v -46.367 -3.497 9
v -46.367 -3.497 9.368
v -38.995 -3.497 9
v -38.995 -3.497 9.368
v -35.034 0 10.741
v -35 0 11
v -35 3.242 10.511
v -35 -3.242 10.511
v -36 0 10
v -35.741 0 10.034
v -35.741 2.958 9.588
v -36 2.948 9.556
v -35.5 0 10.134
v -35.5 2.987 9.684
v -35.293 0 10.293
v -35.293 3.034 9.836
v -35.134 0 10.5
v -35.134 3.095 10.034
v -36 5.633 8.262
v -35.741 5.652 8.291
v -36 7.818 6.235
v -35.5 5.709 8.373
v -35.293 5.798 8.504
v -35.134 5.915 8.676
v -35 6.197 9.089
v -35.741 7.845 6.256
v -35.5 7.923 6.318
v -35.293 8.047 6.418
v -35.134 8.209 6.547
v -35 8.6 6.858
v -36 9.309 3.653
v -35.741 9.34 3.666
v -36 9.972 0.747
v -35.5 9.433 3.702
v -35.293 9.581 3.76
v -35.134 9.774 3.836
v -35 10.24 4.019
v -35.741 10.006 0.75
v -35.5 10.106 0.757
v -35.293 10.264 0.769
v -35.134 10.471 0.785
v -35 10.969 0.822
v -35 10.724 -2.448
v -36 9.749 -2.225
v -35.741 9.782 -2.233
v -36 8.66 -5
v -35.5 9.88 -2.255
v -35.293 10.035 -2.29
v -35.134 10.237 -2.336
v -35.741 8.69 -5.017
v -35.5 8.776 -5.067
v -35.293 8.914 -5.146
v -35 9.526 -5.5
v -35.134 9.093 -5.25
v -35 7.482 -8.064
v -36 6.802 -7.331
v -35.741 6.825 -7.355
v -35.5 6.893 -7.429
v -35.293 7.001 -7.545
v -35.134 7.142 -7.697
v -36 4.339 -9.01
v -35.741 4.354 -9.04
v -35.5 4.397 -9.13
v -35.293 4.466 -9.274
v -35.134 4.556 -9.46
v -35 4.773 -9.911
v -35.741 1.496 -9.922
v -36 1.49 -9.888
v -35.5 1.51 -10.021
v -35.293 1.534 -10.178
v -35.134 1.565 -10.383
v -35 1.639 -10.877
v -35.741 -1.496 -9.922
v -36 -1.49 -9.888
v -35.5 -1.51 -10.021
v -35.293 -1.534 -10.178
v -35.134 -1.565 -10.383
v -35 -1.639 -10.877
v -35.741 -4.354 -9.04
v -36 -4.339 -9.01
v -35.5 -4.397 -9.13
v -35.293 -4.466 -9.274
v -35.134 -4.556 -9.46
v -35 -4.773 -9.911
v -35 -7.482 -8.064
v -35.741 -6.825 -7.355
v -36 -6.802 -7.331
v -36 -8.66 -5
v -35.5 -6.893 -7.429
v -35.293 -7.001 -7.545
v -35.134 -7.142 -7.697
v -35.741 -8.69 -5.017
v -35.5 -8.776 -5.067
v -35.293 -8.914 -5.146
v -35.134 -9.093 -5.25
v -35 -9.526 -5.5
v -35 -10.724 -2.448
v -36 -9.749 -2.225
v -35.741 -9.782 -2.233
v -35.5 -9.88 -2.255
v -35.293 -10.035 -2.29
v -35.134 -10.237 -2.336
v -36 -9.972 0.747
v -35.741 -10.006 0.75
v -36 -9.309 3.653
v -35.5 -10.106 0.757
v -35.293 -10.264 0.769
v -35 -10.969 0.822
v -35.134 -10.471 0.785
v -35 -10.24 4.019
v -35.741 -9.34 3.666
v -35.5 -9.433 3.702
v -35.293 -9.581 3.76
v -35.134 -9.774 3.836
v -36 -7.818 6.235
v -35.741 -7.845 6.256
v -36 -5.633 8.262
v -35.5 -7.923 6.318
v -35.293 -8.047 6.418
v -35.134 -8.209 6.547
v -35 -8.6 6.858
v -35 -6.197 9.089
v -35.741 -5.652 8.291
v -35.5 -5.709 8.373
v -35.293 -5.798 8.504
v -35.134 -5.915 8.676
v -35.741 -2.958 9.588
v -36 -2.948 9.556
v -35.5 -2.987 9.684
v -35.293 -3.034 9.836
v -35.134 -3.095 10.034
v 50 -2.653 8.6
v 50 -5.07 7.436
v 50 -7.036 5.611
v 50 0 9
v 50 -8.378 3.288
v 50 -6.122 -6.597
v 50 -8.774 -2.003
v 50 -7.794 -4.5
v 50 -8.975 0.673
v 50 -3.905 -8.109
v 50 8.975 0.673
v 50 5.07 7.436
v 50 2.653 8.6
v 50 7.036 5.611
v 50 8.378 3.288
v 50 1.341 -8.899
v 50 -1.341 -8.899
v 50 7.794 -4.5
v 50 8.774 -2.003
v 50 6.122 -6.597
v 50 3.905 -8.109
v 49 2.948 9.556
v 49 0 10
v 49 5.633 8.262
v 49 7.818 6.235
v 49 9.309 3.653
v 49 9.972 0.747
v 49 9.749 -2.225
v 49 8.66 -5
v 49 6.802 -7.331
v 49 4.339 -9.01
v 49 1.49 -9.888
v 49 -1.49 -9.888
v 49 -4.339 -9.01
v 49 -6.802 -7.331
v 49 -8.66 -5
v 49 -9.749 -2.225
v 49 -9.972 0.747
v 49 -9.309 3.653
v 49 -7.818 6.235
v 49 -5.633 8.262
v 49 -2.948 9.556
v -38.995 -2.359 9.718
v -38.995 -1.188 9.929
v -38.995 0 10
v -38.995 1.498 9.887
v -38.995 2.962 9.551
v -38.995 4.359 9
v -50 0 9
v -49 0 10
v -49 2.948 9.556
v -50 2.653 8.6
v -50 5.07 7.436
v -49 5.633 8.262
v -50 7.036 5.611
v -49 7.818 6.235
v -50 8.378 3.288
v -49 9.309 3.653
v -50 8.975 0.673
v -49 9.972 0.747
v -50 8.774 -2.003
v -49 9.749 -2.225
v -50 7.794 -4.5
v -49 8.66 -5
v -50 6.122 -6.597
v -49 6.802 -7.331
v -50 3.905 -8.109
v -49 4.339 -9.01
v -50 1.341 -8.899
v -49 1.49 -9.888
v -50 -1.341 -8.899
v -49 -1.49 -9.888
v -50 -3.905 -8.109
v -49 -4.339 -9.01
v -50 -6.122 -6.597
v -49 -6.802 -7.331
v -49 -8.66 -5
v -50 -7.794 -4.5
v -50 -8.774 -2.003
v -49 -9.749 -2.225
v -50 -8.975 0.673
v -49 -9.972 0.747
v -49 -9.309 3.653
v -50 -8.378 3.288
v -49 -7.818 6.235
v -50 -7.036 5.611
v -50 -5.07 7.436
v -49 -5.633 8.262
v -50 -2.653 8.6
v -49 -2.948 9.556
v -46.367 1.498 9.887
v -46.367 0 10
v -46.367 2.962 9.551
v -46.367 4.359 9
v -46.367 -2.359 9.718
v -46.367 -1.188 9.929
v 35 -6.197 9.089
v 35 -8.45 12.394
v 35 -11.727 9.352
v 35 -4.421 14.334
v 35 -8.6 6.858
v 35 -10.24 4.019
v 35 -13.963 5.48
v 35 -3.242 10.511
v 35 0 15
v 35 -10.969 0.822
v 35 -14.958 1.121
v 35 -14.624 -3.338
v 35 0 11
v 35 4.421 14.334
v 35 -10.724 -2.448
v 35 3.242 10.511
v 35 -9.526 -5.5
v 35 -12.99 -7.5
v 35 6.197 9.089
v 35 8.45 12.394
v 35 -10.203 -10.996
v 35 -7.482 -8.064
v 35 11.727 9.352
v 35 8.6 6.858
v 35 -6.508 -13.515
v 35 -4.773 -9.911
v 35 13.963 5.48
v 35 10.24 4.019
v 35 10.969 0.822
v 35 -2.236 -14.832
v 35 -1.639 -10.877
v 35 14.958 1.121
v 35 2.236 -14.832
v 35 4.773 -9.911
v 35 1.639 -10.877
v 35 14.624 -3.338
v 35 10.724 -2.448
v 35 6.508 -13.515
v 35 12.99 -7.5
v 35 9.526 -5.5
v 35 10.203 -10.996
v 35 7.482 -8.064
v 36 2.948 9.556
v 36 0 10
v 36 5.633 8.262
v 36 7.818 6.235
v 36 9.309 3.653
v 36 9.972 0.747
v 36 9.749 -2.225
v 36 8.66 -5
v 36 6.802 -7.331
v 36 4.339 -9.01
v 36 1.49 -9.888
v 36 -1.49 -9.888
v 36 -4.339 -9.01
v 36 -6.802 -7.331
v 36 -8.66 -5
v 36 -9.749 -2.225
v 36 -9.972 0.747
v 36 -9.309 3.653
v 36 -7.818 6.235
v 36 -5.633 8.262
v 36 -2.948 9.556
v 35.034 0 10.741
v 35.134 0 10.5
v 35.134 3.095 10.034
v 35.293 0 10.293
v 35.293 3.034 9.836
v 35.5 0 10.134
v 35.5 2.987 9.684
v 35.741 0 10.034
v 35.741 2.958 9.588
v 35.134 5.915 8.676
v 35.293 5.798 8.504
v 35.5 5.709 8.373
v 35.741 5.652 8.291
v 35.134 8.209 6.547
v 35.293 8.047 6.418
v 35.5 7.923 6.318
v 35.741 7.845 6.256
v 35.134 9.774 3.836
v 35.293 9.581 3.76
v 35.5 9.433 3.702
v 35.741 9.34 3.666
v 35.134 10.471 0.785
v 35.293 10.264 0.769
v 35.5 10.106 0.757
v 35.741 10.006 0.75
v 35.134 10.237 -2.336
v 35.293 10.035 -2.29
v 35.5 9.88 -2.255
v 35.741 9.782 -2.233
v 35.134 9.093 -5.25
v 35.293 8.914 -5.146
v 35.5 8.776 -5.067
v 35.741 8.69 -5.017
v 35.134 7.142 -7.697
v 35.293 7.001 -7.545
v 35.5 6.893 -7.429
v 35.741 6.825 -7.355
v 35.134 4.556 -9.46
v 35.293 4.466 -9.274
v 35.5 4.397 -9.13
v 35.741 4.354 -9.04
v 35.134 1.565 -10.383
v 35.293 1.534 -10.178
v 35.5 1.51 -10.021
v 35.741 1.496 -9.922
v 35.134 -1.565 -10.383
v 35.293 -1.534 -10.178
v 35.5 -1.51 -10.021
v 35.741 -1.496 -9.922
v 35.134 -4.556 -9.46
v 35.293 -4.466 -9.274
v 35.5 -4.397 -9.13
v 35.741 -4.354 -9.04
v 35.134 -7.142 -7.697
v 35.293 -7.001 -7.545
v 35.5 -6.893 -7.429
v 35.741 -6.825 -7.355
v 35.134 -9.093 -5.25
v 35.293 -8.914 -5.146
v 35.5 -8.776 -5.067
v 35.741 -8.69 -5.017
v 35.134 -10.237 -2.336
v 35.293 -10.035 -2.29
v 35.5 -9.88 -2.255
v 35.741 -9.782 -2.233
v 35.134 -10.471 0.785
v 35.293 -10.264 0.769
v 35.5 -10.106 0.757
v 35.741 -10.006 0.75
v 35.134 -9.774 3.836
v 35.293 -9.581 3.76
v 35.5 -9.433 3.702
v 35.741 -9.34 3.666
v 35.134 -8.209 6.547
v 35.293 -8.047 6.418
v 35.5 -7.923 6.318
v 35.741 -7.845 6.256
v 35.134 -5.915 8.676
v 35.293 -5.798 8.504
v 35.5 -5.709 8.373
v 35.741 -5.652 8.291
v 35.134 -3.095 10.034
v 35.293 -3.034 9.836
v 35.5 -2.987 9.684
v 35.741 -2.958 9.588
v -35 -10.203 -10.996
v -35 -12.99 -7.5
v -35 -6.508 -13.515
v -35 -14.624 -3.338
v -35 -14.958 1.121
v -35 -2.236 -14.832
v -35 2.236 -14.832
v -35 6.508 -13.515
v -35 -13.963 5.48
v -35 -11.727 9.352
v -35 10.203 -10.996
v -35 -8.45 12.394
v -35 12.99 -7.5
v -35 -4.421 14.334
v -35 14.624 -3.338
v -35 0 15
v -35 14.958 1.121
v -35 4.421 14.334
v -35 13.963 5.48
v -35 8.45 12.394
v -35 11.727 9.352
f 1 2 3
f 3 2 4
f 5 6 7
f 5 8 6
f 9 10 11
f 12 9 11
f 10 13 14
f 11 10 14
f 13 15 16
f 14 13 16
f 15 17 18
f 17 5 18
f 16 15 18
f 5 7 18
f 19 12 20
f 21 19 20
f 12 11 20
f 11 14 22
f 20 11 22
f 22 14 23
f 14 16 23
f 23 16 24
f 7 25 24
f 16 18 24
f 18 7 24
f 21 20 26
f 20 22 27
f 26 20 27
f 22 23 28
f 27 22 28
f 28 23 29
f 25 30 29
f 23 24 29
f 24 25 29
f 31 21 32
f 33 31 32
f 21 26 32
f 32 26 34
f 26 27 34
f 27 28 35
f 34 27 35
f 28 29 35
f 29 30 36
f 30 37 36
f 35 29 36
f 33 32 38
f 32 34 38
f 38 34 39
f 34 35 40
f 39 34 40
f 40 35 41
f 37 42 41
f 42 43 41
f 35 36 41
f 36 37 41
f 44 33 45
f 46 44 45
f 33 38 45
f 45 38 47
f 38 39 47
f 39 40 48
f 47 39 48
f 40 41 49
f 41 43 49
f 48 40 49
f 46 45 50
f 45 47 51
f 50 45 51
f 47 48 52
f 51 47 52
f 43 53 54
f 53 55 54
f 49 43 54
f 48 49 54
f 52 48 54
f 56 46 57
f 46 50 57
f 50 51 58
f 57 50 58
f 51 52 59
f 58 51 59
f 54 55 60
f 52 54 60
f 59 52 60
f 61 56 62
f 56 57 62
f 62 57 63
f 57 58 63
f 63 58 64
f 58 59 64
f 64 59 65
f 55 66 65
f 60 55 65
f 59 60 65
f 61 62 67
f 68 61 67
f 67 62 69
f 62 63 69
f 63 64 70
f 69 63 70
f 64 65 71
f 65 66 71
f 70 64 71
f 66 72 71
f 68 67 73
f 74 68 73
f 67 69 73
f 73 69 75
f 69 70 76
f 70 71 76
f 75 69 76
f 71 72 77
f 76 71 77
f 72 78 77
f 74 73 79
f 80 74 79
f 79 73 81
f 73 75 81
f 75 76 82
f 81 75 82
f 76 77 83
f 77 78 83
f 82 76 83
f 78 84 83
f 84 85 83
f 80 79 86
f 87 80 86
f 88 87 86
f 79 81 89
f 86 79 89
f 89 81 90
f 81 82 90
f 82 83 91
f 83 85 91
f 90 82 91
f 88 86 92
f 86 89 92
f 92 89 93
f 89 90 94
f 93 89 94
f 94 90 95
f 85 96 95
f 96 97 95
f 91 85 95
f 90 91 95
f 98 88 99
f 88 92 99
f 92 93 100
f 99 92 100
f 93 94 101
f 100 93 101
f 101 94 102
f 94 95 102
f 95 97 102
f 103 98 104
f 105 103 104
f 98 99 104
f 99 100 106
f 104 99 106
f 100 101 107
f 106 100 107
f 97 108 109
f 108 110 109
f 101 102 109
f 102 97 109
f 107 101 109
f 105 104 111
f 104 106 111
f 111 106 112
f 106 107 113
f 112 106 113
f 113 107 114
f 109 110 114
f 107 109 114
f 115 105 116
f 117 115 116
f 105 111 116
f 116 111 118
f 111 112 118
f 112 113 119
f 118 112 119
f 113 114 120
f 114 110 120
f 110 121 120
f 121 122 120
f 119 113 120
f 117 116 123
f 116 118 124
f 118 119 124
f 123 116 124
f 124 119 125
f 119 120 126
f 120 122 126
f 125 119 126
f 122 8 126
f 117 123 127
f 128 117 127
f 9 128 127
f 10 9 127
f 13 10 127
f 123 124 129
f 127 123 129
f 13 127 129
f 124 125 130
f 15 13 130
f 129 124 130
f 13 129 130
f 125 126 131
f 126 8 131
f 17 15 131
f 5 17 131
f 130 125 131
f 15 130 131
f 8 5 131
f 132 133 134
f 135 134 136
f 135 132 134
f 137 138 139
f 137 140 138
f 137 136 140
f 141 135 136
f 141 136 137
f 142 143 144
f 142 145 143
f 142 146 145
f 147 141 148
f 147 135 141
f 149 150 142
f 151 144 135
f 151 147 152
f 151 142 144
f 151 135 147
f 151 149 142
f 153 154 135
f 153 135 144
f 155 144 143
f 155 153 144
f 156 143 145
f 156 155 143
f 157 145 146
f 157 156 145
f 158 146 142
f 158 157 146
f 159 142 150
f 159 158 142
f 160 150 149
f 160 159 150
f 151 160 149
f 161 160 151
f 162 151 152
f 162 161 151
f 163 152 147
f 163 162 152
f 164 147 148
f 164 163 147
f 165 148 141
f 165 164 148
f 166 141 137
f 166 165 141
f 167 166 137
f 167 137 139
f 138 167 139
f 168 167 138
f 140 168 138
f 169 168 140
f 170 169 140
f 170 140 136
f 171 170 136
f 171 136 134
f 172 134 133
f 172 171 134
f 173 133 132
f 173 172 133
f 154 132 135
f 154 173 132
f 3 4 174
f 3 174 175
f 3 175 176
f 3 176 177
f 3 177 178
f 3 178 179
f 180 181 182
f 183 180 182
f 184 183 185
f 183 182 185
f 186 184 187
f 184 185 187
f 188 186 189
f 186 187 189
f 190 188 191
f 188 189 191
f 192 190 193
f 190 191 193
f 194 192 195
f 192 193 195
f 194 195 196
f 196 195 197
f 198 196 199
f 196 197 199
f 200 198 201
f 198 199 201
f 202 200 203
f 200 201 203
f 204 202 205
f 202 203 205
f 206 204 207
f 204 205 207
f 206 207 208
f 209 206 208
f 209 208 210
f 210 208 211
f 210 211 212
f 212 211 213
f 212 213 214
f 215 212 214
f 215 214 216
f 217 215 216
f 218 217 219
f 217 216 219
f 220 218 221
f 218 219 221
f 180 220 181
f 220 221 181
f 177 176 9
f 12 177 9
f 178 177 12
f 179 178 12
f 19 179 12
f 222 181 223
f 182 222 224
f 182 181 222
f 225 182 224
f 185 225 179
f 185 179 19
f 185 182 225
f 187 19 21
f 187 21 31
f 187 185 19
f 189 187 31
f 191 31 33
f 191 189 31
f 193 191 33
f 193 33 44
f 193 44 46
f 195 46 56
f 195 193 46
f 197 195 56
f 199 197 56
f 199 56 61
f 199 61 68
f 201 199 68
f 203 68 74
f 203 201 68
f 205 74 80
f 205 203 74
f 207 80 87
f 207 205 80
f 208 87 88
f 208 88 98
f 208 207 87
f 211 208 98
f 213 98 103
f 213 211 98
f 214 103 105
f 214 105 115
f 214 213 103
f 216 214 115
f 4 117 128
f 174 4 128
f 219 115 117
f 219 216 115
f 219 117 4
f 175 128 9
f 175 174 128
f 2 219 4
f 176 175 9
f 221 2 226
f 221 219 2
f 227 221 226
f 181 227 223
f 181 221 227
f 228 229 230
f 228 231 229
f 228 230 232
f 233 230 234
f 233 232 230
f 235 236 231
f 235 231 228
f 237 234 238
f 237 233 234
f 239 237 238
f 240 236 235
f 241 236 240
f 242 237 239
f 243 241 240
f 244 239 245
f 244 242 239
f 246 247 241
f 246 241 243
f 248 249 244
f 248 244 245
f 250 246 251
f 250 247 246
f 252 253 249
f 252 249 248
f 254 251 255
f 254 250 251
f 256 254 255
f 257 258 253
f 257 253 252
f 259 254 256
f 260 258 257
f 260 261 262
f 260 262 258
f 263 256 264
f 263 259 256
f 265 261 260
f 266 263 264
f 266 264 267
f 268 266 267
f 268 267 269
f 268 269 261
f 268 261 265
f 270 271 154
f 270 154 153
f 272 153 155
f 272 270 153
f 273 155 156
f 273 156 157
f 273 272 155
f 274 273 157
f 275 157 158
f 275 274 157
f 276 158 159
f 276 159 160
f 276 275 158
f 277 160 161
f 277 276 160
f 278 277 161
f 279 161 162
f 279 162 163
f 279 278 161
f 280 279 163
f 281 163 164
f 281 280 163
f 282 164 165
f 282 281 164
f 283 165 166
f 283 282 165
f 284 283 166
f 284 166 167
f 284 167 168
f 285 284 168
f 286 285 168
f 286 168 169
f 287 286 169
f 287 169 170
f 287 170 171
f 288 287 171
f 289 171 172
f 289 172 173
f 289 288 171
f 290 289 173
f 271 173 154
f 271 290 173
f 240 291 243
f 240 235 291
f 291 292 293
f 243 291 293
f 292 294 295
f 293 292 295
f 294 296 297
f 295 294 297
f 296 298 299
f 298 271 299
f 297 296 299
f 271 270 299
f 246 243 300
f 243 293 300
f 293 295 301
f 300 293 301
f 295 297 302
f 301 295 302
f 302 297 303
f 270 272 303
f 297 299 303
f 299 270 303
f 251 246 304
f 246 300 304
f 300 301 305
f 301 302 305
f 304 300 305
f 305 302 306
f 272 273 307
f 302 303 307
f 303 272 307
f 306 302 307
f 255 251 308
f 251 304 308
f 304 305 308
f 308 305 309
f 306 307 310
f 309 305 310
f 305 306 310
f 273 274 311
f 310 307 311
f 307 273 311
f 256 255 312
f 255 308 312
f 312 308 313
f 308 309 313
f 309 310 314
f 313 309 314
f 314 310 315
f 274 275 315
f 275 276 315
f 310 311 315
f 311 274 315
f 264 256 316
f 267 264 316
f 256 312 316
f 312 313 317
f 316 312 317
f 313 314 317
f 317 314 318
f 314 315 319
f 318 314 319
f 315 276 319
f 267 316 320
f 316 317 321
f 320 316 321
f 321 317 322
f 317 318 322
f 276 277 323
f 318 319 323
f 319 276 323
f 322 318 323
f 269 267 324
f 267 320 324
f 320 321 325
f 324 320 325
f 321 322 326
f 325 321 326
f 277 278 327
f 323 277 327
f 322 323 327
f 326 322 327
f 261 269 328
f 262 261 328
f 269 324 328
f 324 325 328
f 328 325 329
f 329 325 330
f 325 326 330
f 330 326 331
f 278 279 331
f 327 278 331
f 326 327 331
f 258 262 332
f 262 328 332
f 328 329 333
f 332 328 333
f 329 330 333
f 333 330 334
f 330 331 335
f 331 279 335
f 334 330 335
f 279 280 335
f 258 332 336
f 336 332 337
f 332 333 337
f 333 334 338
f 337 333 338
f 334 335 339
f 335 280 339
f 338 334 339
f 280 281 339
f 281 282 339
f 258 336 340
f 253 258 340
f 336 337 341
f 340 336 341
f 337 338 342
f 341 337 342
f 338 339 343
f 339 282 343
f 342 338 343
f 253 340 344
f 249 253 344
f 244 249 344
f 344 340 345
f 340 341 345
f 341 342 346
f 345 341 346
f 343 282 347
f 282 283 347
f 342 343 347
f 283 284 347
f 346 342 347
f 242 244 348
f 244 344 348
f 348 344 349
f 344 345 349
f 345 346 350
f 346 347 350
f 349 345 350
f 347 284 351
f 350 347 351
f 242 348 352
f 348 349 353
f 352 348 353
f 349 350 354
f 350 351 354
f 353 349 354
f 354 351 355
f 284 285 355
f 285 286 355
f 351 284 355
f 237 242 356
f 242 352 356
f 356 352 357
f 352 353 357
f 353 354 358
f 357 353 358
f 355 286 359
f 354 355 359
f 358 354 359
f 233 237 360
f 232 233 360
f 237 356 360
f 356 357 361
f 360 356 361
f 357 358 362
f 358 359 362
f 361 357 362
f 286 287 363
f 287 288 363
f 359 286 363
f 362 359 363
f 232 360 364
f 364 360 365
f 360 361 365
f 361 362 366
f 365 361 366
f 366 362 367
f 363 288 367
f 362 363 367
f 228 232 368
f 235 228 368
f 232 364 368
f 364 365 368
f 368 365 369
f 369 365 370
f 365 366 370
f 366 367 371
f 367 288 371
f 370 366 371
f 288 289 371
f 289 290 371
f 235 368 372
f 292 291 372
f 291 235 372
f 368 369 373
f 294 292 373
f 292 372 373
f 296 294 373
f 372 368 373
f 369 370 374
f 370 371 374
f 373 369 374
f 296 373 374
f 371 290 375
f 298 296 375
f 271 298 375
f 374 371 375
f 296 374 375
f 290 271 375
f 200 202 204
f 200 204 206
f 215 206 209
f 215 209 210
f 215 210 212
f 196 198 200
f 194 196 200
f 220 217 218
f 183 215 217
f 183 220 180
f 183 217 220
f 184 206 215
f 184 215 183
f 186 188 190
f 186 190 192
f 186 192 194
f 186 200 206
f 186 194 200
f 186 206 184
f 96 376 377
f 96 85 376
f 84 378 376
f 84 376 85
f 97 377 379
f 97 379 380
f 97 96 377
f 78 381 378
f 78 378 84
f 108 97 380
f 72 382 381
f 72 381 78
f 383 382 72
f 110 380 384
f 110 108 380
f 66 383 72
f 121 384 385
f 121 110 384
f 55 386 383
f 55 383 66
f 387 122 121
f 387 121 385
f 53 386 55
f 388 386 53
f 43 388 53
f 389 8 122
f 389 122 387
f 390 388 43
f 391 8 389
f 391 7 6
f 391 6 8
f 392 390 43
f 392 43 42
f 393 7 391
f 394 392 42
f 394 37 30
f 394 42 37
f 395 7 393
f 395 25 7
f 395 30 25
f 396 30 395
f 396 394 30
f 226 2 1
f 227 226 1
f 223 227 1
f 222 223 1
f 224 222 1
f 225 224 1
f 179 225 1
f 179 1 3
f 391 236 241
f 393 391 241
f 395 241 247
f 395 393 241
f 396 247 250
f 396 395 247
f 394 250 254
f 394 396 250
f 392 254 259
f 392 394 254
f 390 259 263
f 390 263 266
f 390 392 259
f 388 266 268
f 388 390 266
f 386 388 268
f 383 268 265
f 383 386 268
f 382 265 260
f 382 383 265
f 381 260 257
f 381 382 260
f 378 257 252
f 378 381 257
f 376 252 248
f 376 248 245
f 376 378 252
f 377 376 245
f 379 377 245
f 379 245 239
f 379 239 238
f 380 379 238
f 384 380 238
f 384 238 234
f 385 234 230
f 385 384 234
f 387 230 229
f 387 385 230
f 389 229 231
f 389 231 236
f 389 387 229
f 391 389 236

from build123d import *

# Parameters (mm, degrees)
F2_SIZE  = 1
F3_R     = 1
F5_W     = 7.37243
F5_H     = 8.687595
F6_DEPTH = 1


with BuildPart() as f1:
    # F0 (on Front) → F1 (revolve)
    with BuildSketch(Plane.XZ):
        Polygon((-50, 10), (-50, 0), (50, 0), (50, 10), (35, 10), (35, 15), (-35, 15), (-35, 10), align=None)
    revolve(axis=Axis((0, 0, 0), (-1, 0, 0)))

    # F2
    f2_edges = [f1.edges().sort_by_distance(p)[0] for p in [
        (-50, 0, -10),
        (50, 0, -10),
    ]]
    chamfer(f2_edges, length=F2_SIZE)

    # F3
    f3_edges = [f1.edges().sort_by_distance(p)[0] for p in [
        (-35, 0, -10),
        (35, 0, -10),
    ]]
    fillet(f3_edges, radius=F3_R)

    # F5 (on offset) → F6 (cut)
    with BuildSketch(Plane.XY.offset(10)):
        with Locations((-42.681136, 0.846396)):
            Rectangle(F5_W, F5_H)
    extrude(amount=-F6_DEPTH, mode=Mode.SUBTRACT)


solid = f1.part
